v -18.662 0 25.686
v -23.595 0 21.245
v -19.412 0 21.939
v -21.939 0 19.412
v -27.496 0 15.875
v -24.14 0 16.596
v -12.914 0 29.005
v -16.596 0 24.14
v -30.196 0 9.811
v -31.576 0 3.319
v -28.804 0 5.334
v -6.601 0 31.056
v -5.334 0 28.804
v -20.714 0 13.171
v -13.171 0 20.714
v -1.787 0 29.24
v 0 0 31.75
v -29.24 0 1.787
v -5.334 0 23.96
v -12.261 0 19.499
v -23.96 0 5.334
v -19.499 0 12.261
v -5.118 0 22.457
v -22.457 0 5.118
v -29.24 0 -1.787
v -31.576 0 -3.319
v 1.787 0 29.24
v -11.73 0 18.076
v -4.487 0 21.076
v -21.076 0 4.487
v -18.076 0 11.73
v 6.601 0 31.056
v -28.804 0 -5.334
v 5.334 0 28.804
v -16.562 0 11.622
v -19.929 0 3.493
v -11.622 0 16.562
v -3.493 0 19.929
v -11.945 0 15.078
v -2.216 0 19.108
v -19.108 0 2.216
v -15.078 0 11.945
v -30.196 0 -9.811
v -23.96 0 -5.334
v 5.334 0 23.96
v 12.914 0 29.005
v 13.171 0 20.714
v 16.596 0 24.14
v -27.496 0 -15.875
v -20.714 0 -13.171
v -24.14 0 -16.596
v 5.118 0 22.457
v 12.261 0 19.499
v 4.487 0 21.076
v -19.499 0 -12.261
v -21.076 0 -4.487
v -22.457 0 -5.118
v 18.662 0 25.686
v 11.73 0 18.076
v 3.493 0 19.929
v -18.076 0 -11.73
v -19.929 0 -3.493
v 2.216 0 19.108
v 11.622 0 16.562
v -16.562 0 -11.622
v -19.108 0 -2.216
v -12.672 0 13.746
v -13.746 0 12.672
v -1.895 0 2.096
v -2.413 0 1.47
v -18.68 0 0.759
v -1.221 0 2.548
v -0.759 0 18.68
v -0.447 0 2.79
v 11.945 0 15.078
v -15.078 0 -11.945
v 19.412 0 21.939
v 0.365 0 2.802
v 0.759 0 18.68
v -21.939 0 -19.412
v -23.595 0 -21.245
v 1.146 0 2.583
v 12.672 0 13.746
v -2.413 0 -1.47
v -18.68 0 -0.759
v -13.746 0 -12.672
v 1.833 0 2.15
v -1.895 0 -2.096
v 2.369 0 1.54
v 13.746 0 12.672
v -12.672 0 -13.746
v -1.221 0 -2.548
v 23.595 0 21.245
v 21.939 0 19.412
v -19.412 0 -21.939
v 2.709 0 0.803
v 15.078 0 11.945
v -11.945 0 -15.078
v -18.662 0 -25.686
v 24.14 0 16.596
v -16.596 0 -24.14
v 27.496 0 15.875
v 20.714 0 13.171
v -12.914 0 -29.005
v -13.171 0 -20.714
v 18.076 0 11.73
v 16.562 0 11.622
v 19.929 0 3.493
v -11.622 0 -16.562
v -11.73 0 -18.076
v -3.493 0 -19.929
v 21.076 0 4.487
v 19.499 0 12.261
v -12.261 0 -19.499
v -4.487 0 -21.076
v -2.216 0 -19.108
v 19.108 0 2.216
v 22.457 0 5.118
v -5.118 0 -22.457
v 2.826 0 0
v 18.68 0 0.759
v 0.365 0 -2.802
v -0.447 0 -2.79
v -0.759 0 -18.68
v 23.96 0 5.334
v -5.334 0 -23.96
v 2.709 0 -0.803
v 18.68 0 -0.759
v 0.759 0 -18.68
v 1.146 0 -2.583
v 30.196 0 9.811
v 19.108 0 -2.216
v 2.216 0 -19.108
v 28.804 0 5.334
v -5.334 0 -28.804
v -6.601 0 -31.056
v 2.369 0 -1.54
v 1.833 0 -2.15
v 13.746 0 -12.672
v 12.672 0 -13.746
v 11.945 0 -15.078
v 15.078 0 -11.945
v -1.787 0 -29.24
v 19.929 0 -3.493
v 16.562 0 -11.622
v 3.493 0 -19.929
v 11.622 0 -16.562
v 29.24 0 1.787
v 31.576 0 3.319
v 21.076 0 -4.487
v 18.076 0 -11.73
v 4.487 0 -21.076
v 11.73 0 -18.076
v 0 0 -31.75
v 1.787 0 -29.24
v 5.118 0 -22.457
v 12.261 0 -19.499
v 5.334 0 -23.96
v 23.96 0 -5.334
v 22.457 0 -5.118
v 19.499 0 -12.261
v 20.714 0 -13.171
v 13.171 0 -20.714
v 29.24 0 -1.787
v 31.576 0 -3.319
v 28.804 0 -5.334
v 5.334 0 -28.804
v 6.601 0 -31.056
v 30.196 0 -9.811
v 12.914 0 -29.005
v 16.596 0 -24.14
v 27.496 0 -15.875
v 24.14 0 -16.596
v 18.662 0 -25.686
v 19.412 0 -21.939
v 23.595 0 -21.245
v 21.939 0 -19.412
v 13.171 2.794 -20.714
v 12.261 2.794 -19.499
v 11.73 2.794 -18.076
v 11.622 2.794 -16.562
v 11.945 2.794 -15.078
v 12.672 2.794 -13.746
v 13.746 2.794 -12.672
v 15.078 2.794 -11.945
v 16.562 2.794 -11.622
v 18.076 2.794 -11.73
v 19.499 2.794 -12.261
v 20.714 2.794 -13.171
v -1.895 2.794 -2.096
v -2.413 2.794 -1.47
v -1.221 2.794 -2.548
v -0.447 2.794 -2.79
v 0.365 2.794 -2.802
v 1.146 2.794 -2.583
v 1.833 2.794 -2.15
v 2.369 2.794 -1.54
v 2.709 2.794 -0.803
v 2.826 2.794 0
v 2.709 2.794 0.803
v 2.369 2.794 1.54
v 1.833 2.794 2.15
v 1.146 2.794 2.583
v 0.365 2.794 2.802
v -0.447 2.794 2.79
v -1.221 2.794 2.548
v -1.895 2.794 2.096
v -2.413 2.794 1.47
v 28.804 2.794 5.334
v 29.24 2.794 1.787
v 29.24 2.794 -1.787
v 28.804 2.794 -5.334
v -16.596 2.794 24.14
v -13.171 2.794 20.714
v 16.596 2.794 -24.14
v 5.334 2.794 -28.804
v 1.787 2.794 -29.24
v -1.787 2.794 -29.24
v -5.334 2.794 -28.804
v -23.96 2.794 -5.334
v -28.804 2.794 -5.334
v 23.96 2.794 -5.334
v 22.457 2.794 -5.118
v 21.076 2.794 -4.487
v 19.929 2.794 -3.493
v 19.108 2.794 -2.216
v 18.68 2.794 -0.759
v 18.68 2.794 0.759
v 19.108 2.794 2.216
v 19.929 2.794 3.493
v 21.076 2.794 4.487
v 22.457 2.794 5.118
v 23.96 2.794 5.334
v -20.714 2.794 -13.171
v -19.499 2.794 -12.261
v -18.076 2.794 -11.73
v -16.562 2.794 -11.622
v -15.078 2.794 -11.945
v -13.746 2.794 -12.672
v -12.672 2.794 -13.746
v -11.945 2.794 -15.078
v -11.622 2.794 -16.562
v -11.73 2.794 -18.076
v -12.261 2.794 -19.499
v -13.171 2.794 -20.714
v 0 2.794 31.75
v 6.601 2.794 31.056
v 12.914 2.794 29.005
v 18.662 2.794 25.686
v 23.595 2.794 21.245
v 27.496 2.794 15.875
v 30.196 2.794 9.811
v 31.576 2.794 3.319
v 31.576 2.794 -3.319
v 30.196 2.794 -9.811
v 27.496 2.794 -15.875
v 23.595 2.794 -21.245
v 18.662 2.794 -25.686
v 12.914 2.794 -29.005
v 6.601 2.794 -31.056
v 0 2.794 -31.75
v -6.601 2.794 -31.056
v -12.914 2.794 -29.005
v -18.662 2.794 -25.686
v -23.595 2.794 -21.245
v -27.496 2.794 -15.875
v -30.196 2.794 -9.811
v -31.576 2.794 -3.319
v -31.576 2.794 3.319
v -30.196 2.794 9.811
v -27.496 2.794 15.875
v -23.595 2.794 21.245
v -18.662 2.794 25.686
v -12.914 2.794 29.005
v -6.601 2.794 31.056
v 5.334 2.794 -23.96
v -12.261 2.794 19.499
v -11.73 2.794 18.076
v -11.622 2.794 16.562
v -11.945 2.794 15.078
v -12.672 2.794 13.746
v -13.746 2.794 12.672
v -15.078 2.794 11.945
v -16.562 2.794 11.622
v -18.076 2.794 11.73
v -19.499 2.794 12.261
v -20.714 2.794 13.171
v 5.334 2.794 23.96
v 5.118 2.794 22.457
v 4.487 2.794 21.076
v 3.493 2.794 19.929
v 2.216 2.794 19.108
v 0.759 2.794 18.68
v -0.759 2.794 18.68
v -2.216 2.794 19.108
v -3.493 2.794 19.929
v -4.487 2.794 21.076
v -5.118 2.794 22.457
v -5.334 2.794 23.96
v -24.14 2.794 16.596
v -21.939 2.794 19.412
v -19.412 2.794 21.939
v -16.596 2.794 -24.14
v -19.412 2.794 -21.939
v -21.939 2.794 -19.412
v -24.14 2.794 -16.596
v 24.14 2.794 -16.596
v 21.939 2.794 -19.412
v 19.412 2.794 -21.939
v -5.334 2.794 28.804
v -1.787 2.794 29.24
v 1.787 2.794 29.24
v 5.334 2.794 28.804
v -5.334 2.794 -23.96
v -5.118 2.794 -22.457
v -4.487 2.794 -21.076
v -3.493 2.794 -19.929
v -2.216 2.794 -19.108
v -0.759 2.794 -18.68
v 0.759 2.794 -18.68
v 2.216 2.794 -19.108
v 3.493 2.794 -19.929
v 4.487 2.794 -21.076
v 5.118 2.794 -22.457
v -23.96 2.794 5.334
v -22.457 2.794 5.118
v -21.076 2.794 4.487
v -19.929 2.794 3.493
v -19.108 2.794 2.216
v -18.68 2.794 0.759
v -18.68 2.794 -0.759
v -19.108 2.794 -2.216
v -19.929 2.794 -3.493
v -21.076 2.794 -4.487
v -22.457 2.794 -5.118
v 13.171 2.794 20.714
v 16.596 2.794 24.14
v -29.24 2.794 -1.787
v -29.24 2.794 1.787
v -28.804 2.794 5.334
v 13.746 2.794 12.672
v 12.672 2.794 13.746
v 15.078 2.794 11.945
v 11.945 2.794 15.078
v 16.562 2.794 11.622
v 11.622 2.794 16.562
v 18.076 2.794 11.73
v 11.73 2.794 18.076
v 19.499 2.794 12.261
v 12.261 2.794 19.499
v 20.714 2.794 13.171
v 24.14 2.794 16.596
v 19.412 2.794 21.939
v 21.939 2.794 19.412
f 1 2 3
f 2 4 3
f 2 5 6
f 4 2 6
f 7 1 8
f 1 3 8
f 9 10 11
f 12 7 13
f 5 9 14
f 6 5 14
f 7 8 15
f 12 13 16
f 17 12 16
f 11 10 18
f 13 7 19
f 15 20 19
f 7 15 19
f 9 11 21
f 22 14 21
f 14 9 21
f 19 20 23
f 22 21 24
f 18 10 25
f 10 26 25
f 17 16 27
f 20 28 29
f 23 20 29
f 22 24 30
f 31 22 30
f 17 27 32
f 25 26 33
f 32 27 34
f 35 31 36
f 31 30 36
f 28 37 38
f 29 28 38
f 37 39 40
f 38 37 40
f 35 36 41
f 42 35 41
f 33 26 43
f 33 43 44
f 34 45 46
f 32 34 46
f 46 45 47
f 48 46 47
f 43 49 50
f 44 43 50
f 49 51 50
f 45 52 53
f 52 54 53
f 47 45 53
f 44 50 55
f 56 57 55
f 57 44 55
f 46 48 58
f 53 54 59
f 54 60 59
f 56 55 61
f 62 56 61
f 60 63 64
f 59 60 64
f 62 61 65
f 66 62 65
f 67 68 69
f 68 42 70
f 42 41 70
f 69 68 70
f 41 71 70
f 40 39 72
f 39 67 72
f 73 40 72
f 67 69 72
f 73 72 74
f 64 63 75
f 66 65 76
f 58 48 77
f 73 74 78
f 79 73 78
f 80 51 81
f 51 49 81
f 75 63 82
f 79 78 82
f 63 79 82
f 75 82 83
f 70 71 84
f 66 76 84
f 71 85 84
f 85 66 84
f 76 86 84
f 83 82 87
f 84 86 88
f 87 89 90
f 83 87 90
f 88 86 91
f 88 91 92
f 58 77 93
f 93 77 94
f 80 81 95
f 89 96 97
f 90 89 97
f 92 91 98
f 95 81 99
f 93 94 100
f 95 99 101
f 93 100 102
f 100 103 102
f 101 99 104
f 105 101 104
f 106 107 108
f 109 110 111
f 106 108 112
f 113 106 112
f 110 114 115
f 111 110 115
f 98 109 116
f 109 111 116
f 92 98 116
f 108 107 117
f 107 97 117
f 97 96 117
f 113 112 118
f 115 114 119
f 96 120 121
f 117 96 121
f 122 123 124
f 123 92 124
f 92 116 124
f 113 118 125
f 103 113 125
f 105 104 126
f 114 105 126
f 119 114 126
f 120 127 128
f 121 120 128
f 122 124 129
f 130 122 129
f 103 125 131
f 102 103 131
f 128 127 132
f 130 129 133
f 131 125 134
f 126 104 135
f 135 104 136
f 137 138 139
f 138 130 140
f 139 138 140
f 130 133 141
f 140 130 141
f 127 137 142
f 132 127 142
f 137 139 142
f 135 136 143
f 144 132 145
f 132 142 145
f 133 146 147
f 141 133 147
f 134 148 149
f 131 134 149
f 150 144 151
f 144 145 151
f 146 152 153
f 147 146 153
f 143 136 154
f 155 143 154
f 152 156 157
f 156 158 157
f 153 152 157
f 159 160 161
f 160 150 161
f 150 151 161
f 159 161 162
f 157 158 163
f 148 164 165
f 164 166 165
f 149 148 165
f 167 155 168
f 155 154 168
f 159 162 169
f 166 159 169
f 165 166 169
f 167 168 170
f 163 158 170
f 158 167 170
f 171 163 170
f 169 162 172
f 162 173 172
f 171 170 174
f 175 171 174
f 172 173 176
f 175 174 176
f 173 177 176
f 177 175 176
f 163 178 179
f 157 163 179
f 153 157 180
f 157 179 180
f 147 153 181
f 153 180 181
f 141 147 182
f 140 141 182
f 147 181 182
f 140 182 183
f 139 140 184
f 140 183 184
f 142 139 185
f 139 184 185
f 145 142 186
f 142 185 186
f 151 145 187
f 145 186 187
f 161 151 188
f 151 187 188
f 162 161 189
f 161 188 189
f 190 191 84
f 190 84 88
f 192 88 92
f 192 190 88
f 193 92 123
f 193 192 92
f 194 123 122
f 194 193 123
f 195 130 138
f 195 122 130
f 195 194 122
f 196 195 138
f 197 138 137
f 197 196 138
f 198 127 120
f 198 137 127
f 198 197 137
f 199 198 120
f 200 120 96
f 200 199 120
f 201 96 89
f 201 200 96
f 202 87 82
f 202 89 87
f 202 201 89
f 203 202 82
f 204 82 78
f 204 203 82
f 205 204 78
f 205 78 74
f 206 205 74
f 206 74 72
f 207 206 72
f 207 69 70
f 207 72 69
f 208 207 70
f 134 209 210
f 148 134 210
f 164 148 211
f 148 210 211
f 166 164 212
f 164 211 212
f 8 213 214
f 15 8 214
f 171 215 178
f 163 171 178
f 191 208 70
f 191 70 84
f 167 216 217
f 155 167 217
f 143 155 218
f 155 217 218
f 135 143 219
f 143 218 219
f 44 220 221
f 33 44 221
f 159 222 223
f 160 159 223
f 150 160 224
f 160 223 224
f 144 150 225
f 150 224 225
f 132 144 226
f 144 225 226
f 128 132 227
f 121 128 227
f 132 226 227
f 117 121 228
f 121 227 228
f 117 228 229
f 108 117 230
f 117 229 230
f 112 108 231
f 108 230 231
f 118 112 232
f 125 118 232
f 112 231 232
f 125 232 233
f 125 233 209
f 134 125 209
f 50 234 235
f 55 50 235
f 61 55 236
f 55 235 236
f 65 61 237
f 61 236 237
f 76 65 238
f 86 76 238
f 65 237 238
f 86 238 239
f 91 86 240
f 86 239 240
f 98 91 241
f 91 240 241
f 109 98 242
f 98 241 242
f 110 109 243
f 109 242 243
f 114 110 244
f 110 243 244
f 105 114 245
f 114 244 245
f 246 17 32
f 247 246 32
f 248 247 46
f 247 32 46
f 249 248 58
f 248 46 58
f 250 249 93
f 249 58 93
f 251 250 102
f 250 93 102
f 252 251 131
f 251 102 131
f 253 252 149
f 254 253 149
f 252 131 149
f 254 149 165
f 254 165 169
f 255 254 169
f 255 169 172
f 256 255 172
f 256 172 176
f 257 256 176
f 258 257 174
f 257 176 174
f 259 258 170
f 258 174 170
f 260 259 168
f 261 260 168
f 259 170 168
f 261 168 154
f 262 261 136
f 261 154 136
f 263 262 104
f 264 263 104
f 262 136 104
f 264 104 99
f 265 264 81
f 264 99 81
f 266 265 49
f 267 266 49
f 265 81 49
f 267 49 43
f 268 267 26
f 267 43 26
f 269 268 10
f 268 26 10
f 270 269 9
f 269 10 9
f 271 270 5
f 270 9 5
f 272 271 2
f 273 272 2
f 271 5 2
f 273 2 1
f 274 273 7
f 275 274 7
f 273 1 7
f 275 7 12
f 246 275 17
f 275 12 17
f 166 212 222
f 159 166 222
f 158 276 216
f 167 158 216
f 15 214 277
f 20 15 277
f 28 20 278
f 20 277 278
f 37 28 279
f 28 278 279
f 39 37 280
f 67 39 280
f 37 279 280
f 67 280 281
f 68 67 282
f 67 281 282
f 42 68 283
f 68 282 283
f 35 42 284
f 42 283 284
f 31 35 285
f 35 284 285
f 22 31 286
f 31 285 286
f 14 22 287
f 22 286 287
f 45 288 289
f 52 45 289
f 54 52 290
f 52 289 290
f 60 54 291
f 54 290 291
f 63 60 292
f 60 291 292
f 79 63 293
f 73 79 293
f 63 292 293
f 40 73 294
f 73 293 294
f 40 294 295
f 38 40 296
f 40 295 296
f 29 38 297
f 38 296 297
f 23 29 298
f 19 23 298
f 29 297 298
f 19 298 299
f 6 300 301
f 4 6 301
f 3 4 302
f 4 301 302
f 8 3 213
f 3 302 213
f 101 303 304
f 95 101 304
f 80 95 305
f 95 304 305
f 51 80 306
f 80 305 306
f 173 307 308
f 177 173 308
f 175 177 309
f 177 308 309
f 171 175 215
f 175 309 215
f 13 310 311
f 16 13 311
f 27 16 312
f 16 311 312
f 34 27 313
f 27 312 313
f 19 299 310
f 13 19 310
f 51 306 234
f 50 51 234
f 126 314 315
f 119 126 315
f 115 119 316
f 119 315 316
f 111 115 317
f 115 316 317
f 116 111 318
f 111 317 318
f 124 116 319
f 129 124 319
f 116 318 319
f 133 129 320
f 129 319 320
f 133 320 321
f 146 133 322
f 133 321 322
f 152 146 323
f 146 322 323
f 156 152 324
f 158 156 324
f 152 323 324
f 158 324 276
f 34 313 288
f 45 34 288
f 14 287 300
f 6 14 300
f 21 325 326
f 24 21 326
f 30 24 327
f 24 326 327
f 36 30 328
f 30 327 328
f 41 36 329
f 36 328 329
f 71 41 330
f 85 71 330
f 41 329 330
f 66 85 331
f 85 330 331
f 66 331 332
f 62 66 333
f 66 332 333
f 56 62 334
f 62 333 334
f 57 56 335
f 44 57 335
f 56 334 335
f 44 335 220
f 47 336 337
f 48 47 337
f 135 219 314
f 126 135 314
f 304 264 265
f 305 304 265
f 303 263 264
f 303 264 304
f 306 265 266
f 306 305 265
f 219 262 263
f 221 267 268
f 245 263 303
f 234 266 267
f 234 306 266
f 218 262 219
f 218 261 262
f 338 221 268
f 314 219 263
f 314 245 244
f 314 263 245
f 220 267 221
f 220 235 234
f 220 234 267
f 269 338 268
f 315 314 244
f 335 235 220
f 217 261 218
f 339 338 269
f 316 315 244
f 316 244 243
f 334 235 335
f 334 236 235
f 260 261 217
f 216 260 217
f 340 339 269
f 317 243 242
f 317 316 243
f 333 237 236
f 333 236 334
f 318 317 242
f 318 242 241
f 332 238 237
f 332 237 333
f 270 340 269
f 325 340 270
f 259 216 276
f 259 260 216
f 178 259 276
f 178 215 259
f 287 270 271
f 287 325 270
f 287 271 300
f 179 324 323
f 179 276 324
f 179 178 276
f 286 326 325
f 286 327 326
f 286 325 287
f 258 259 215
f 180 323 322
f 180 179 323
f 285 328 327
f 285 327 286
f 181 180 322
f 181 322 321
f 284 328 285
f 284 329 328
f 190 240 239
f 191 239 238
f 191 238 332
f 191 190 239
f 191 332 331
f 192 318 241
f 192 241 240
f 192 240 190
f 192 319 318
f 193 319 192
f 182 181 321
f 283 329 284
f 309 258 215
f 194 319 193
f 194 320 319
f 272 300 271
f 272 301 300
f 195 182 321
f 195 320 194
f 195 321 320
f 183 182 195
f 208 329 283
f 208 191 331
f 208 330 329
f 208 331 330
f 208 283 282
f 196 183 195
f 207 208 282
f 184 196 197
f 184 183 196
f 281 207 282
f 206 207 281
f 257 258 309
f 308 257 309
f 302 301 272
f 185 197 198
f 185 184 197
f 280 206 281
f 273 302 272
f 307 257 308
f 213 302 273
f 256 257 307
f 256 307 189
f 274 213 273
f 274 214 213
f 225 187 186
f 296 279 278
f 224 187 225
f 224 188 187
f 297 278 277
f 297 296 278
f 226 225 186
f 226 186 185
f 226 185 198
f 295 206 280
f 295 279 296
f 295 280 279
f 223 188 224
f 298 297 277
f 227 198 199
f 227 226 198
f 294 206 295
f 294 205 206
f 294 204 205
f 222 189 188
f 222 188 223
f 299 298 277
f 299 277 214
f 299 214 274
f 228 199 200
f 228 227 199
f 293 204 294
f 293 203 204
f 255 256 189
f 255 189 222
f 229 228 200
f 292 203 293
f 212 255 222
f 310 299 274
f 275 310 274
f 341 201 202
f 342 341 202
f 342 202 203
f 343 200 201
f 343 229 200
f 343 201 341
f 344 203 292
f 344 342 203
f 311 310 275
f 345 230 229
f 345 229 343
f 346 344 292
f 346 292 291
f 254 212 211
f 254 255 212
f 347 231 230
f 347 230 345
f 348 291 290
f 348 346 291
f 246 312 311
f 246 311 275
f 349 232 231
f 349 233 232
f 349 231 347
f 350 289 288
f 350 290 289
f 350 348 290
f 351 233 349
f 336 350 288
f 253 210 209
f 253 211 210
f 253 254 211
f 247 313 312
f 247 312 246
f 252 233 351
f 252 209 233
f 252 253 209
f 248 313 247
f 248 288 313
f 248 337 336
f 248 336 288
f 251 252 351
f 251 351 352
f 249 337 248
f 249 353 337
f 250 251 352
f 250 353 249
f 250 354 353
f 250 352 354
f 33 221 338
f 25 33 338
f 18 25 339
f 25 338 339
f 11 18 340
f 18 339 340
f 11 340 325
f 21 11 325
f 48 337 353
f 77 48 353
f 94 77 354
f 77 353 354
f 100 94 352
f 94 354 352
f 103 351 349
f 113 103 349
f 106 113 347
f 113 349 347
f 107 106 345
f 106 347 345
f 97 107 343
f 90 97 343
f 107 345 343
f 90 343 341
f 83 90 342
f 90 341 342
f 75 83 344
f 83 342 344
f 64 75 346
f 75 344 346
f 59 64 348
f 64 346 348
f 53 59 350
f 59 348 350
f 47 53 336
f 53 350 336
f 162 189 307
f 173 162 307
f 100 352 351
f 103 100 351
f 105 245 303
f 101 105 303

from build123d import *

# Parameters (mm, degrees)
SKETCH2_R           = 31.75
SKETCH2_R_2         = 29.294123568
BOSS_EXTRUDE1_DEPTH = 2.794
CUT_EXTRUDE1_DEPTH  = 46.01339384
CUT_EXTRUDE2_DEPTH  = 46.01339384


with BuildPart() as part:
    # Sketch2 → Boss-Extrude1 (new body)
    # profile 1 of 2: a face of its own
    with BuildSketch(Plane(origin=(0, 0, 0), x_dir=(1, 0, 0), z_dir=(0, 1, 0))):
        with Locations(Location((0, 0, 0), (0, 0, 270))):
            Circle(SKETCH2_R)
        Circle(SKETCH2_R_2, mode=Mode.SUBTRACT)
    # profile 2 of 2: a face of its own
    with BuildSketch(Plane(origin=(0, 0, 0), x_dir=(1, 0, 0), z_dir=(0, 1, 0))):
        Circle(SKETCH2_R_2)
    extrude(amount=BOSS_EXTRUDE1_DEPTH)

    # Sketch3 → Cut-Extrude1 (cut, through all)
    with BuildSketch(Plane(origin=(0, 3.175, 0), x_dir=(1, 0, 0), z_dir=(0, 1, 0))):
        with BuildLine():
            Line((5.334, -28.804411461), (5.334, -23.960123568))
            ThreePointArc((5.334, -23.960123568), (0, -18.626123568), (-5.334, -23.960123568))
            Line((-5.334, -23.960123568), (-5.334, -28.804411461))
            ThreePointArc((-5.334, -28.804411461), (0, -29.294123568), (5.334, -28.804411461))
        make_face()
        with BuildLine():
            Line((-20.714073424, -13.170658282), (-24.139502243, -16.596087101))
            ThreePointArc((-24.139502243, -16.596087101), (-20.714073424, -20.714073424), (-16.596087101, -24.139502243))
            Line((-16.596087101, -24.139502243), (-13.170658282, -20.714073424))
            ThreePointArc((-13.170658282, -20.714073424), (-13.170658282, -13.170658282), (-20.714073424, -13.170658282))
        make_face()
        with BuildLine():
            Line((-23.960123568, 5.334), (-28.804411461, 5.334))
            ThreePointArc((-28.804411461, 5.334), (-29.294123568, 0), (-28.804411461, -5.334))
            Line((-28.804411461, -5.334), (-23.960123568, -5.334))
            ThreePointArc((-23.960123568, -5.334), (-18.626123568, 0), (-23.960123568, 5.334))
        make_face()
        with BuildLine():
            Line((-13.170658282, 20.714073424), (-16.596087101, 24.139502243))
            ThreePointArc((-16.596087101, 24.139502243), (-20.714073424, 20.714073424), (-24.139502243, 16.596087101))
            Line((-24.139502243, 16.596087101), (-20.714073424, 13.170658282))
            ThreePointArc((-20.714073424, 13.170658282), (-13.170658282, 13.170658282), (-13.170658282, 20.714073424))
        make_face()
        with BuildLine():
            Line((5.334, 23.960123568), (5.334, 28.804411461))
            ThreePointArc((5.334, 28.804411461), (0, 29.294123568), (-5.334, 28.804411461))
            Line((-5.334, 28.804411461), (-5.334, 23.960123568))
            ThreePointArc((-5.334, 23.960123568), (0, 18.626123568), (5.334, 23.960123568))
        make_face()
        with BuildLine():
            Line((20.714073424, 13.170658282), (24.139502243, 16.596087101))
            ThreePointArc((24.139502243, 16.596087101), (20.714073424, 20.714073424), (16.596087101, 24.139502243))
            Line((16.596087101, 24.139502243), (13.170658282, 20.714073424))
            ThreePointArc((13.170658282, 20.714073424), (13.170658282, 13.170658282), (20.714073424, 13.170658282))
        make_face()
        with BuildLine():
            Line((23.960123568, -5.334), (28.804411461, -5.334))
            ThreePointArc((28.804411461, -5.334), (29.294123568, 0), (28.804411461, 5.334))
            Line((28.804411461, 5.334), (23.960123568, 5.334))
            ThreePointArc((23.960123568, 5.334), (18.626123568, 0), (23.960123568, -5.334))
        make_face()
        with BuildLine():
            Line((13.170658282, -20.714073424), (16.596087101, -24.139502243))
            ThreePointArc((16.596087101, -24.139502243), (20.714073424, -20.714073424), (24.139502243, -16.596087101))
            Line((24.139502243, -16.596087101), (20.714073424, -13.170658282))
            ThreePointArc((20.714073424, -13.170658282), (13.170658282, -13.170658282), (13.170658282, -20.714073424))
        make_face()
    extrude(amount=-CUT_EXTRUDE1_DEPTH, mode=Mode.SUBTRACT)

    # Sketch4 → Cut-Extrude2 (cut, through all)
    with BuildSketch(Plane(origin=(0, 3.175, 0), x_dir=(1, 0, 0), z_dir=(0, 1, 0))):
        with BuildLine():
            Line((-2.413, -1.470474094), (-2.413, 1.470474094))
            ThreePointArc((-2.413, 1.470474094), (2.82575, 0), (-2.413, -1.470474094))
        make_face()
    extrude(amount=-CUT_EXTRUDE2_DEPTH, mode=Mode.SUBTRACT)


solid = part.part
